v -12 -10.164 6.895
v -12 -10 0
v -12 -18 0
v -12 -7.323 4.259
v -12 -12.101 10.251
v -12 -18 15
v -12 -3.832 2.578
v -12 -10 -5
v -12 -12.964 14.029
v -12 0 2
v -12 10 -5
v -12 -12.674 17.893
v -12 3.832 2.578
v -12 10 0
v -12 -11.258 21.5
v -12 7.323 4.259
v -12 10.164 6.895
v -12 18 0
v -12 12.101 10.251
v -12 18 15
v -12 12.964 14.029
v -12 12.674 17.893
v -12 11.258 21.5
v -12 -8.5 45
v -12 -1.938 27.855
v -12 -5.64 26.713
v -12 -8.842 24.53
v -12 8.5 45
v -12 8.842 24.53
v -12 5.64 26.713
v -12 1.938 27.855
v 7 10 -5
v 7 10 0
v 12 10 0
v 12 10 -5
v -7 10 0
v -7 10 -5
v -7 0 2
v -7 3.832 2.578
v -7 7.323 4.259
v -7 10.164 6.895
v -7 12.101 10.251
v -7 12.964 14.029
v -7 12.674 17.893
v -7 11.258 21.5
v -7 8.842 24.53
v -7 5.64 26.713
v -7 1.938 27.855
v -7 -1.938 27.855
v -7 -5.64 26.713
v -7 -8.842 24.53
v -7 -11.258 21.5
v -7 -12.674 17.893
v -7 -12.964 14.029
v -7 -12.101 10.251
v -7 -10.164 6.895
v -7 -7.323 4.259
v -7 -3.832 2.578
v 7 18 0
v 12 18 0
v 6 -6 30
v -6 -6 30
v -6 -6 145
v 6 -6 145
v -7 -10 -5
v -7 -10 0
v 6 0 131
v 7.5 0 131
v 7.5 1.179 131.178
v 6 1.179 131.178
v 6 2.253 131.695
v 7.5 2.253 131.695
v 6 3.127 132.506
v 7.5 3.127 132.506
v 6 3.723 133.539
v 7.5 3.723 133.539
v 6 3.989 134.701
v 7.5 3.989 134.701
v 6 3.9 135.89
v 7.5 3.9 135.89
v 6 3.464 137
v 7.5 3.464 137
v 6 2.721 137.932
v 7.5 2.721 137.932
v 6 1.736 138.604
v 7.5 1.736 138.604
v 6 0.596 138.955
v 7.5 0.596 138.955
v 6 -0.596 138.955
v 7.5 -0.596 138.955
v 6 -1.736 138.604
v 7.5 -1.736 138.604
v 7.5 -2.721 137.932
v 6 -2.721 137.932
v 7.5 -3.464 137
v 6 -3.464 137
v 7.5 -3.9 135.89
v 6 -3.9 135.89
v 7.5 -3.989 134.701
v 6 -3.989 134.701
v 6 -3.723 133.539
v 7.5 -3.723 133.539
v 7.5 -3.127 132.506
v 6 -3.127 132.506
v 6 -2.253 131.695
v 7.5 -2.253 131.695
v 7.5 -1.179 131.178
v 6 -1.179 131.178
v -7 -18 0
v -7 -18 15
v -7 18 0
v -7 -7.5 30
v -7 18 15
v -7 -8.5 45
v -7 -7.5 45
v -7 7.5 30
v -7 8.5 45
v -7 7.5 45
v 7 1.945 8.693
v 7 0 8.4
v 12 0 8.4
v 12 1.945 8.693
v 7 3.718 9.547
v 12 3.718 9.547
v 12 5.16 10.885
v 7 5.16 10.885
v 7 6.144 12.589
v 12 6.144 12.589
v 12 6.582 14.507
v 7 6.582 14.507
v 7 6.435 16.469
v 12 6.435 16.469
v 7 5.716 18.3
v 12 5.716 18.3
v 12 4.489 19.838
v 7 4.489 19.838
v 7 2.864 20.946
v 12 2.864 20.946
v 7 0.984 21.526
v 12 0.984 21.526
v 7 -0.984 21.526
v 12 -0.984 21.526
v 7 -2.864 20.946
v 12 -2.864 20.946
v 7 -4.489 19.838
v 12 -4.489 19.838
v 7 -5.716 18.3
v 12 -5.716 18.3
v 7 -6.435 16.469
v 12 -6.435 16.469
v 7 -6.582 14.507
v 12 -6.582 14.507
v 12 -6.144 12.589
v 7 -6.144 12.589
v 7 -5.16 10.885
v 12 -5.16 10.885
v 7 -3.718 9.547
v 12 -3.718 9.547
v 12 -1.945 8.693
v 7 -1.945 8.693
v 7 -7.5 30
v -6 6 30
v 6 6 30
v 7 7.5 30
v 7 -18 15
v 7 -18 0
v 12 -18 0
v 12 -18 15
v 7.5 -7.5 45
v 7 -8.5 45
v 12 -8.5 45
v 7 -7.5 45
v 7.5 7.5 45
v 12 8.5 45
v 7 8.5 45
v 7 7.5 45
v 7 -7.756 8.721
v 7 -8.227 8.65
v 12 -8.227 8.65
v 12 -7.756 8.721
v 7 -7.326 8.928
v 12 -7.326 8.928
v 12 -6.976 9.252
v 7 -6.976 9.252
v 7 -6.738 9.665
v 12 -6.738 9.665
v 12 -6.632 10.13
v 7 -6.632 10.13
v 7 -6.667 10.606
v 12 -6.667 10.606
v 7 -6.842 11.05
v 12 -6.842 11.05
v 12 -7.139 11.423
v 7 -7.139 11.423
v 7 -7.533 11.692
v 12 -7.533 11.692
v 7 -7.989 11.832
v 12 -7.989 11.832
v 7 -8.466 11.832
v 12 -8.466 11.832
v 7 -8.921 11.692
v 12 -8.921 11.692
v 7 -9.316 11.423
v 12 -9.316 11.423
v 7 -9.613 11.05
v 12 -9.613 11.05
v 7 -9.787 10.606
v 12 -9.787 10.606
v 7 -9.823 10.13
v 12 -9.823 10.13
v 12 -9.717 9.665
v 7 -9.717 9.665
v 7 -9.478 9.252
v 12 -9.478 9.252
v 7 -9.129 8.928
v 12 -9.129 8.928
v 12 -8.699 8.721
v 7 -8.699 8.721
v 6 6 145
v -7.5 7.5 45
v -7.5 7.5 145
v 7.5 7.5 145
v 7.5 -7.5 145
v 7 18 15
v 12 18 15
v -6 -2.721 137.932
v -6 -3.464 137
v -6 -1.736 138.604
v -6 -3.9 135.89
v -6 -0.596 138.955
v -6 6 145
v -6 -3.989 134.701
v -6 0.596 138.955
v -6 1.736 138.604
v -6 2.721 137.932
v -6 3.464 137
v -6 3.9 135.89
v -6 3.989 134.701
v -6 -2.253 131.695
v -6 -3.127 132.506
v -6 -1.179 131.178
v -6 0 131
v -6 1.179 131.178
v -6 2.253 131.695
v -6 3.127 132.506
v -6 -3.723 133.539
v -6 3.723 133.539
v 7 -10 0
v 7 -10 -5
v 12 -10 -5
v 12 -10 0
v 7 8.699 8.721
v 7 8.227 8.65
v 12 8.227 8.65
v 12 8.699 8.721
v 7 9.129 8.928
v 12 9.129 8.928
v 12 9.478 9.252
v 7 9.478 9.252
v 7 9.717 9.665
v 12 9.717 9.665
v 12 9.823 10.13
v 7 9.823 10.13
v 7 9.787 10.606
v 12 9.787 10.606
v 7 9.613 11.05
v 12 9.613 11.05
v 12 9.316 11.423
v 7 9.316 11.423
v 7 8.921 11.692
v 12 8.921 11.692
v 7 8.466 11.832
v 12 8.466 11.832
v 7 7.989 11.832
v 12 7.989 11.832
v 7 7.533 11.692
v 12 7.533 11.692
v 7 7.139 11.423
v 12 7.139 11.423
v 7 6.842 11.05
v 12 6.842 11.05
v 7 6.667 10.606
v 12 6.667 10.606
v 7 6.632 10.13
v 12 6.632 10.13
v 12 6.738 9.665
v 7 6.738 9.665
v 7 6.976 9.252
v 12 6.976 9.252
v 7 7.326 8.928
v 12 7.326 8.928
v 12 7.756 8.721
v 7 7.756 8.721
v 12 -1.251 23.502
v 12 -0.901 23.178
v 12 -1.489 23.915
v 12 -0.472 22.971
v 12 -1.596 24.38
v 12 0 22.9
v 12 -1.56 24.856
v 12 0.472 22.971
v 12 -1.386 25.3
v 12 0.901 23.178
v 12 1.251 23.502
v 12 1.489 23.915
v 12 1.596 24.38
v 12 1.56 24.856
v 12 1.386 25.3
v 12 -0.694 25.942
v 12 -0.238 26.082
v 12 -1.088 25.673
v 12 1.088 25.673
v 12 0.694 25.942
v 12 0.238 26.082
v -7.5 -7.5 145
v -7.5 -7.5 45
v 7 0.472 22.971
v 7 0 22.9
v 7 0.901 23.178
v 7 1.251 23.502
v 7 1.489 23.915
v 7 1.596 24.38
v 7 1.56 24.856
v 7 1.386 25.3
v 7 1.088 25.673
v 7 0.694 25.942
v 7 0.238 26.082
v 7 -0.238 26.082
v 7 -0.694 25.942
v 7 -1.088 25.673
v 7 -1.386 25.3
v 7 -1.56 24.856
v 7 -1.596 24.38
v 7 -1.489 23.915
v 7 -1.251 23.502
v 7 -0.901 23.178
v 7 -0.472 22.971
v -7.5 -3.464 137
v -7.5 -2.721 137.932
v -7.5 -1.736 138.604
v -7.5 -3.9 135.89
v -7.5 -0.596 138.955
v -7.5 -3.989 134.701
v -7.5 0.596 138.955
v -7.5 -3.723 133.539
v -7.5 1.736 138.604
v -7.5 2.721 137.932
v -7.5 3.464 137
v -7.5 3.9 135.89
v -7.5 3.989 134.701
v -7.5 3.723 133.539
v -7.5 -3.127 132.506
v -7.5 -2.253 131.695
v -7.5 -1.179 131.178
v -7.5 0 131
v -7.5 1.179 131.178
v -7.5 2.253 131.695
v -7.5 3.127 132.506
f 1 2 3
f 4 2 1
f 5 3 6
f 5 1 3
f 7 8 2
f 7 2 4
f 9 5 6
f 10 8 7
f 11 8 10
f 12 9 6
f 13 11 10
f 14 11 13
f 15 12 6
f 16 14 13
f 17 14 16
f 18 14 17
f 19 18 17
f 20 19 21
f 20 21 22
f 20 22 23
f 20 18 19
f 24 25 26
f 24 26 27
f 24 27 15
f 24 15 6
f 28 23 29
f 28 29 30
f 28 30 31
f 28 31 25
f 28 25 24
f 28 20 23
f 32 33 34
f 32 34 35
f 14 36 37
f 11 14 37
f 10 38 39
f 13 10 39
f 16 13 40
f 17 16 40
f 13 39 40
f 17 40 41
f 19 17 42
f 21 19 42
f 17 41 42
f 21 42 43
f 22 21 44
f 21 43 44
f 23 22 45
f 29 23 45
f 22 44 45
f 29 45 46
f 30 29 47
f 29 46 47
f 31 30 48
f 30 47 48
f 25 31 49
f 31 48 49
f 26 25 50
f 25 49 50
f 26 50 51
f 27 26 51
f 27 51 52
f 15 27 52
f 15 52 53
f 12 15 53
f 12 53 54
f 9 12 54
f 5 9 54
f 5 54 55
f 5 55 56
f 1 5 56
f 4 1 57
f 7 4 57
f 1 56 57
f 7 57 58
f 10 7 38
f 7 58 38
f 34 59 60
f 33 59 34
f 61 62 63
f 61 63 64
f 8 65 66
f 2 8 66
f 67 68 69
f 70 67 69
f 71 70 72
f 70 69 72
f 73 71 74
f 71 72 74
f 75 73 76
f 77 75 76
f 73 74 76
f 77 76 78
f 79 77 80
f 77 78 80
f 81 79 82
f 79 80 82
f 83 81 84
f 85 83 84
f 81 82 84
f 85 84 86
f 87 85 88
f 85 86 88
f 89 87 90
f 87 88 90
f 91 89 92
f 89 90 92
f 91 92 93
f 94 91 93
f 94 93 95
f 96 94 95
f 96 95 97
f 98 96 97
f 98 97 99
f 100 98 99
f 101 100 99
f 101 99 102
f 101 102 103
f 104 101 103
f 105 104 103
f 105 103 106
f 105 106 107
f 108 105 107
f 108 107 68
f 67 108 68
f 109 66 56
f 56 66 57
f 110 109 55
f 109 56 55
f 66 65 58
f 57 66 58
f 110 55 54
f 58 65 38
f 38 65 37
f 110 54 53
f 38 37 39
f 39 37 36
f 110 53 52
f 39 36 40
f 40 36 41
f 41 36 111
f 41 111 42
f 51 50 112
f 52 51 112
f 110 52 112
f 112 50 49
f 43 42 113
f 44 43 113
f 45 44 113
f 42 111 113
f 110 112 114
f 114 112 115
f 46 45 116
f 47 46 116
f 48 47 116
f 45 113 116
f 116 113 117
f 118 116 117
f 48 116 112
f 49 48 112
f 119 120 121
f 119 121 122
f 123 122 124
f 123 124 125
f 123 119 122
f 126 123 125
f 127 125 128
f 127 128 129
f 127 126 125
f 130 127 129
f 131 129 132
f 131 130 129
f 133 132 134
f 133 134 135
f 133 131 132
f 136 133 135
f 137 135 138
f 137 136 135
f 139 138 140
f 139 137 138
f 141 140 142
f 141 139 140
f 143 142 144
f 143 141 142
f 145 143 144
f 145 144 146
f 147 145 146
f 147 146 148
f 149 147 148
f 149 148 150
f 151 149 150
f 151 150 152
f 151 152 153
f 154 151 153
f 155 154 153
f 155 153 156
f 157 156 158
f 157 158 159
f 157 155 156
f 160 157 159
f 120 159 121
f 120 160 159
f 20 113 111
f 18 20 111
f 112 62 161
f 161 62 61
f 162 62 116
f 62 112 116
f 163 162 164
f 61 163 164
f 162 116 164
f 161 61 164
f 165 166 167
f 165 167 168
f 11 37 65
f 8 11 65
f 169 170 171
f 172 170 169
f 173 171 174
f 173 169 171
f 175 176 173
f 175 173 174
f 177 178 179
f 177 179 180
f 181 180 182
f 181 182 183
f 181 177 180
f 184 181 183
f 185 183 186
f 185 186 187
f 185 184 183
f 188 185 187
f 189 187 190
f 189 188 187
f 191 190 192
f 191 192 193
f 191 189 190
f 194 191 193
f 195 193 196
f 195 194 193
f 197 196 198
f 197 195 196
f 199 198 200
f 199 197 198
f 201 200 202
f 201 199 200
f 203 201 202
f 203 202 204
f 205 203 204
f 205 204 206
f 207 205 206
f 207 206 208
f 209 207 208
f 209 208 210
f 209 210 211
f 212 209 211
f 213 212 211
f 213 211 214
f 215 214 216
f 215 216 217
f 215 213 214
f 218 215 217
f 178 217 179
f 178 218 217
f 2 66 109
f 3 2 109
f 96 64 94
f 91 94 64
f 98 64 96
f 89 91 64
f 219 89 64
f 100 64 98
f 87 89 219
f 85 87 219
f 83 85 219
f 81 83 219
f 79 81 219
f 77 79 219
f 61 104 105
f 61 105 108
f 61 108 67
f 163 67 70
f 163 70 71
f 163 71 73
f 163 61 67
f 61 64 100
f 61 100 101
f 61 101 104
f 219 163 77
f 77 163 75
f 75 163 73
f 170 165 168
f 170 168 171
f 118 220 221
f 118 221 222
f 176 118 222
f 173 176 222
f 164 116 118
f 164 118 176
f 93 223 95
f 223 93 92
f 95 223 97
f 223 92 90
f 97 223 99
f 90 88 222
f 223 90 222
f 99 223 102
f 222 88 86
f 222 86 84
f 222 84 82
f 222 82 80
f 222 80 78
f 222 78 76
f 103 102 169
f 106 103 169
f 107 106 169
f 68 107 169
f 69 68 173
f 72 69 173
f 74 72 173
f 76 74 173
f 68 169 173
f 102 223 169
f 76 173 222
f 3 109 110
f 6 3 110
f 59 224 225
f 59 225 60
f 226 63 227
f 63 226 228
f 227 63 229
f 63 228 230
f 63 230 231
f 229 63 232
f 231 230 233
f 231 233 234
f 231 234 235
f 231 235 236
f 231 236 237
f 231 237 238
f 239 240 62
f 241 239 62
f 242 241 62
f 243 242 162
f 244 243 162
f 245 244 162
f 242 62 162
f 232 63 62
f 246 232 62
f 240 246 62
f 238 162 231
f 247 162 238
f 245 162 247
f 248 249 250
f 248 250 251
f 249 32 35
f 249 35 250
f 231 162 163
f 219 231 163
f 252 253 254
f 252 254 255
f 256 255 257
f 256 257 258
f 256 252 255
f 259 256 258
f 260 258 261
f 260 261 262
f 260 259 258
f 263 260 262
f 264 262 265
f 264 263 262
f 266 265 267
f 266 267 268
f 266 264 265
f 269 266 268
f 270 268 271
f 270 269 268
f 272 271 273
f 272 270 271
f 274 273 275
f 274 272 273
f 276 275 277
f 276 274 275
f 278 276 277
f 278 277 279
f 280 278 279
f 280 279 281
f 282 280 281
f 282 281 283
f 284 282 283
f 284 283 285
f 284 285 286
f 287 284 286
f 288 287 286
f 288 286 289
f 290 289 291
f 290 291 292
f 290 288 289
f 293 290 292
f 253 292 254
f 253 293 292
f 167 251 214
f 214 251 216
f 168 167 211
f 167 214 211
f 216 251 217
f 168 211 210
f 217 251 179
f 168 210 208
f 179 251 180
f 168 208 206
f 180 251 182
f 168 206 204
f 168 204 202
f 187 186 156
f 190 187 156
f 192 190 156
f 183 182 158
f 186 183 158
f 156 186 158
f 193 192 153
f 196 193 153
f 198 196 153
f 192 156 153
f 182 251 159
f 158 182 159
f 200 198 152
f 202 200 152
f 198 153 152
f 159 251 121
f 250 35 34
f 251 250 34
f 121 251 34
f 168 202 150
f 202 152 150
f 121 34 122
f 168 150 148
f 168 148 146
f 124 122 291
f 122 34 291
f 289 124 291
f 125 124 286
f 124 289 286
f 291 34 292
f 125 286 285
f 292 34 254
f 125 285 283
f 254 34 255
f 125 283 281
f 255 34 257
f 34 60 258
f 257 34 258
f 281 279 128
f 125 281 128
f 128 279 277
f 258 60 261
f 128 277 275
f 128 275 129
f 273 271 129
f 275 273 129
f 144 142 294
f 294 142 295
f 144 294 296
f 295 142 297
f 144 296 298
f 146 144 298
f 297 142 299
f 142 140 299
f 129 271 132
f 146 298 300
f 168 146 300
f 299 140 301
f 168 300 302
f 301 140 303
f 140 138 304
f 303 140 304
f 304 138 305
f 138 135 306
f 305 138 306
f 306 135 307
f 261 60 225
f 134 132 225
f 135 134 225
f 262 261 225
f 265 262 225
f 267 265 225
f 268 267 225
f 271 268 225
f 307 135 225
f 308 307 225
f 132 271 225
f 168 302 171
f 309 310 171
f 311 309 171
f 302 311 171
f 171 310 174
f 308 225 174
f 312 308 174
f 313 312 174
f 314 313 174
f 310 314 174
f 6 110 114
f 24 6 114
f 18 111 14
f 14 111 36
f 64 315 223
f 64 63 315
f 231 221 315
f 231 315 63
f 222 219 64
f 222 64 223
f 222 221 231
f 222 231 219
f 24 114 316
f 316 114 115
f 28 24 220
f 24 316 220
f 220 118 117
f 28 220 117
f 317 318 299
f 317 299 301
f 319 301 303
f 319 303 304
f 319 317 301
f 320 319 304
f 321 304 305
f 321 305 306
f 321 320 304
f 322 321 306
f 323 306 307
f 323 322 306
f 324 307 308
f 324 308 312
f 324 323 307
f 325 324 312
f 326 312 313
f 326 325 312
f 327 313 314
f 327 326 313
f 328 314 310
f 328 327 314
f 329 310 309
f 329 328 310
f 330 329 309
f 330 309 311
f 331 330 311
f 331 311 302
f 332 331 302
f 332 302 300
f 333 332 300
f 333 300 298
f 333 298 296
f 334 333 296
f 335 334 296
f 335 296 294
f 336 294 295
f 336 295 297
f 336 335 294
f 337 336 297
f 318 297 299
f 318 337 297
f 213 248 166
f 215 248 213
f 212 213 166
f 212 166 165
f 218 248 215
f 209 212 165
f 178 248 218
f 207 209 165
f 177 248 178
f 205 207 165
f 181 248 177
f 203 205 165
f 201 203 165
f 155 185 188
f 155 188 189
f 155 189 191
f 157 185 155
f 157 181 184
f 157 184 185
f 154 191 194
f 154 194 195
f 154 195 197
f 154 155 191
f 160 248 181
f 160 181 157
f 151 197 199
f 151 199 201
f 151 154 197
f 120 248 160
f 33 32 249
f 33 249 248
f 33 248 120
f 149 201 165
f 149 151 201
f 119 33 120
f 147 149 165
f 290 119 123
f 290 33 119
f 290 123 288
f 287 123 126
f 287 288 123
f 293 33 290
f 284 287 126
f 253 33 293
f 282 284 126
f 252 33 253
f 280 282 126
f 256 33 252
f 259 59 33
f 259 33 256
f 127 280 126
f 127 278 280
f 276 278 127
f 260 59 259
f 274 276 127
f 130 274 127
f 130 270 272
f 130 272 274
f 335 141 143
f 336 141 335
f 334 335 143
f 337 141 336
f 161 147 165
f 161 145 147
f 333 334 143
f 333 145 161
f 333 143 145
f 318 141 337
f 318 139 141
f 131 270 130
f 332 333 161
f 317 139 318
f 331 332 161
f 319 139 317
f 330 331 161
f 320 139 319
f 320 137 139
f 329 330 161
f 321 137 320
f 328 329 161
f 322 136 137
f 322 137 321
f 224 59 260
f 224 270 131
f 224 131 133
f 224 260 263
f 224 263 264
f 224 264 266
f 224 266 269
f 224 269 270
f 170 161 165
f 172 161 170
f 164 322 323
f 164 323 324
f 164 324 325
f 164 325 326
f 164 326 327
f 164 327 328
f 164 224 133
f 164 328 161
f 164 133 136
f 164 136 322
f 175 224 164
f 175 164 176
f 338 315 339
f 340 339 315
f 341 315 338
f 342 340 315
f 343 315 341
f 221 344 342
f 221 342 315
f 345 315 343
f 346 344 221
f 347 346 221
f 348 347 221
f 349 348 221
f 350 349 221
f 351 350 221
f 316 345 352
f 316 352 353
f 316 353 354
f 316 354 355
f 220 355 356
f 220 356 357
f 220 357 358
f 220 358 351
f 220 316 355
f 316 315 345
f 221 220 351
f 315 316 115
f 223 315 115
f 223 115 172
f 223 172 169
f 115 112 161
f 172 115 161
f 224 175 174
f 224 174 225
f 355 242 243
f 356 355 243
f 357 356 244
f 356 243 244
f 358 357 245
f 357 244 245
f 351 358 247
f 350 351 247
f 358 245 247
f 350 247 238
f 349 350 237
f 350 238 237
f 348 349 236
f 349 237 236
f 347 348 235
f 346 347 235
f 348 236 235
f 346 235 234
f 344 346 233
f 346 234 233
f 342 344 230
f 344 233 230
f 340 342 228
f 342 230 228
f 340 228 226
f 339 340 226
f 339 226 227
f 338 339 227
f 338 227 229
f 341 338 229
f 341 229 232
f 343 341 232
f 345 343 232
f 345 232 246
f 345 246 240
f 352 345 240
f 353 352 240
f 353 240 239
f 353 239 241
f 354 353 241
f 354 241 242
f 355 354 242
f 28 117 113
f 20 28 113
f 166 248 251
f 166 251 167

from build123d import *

# Parameters (mm, degrees)
SKETCH_3_R           = 6.6
SKETCH_3_R_2         = 1.6
EXTRUDE_1_DEPTH      = 5
SKETCH_5_R           = 13
EXTRUDE_2_DEPTH      = 5
EXTRUDE_3_DEPTH      = 100
EXTRUDE_3_DEPTH_BACK = 15
SKETCH_6_W           = 15
SKETCH_6_H           = 15
SKETCH_6_W_2         = 12
SKETCH_6_H_2         = 12
SKETCH_7_R           = 4
CUT_EXTRUDE_1_DEPTH  = 148.408446162


with BuildPart() as part:
    # ｽｹｯﾁ3 → ﾎﾞｽ - 押し出し1 (new body)
    with BuildSketch(Plane(origin=(7, 0, 0), x_dir=(0, 0, -1), z_dir=(1, 0, 0))):
        Polygon((5, 10), (5, -10), (0, -10), (0, -18), (-15, -18), (-45, -8.5), (-45, 8.5), (-15, 18), (0, 18), (0, 10), align=None)
        with Locations((-15, 0)):
            Circle(SKETCH_3_R, mode=Mode.SUBTRACT)
        with Locations((-24.5, 0)):
            Circle(SKETCH_3_R_2, mode=Mode.SUBTRACT)
        with Locations((-10.25, 8.227241336)):
            Circle(SKETCH_3_R_2, mode=Mode.SUBTRACT)
        with Locations((-10.25, -8.227241336)):
            Circle(SKETCH_3_R_2, mode=Mode.SUBTRACT)
    extrude(amount=EXTRUDE_1_DEPTH)



with BuildPart() as body_2:
    # ｽｹｯﾁ5 → ﾎﾞｽ - 押し出し2 (new body)
    with BuildSketch(Plane(origin=(-7, 0, 0), x_dir=(0, 0, -1), z_dir=(1, 0, 0))):
        Polygon((-45, -8.5), (-45, 8.5), (-15, 18), (0, 18), (0, 10), (5, 10), (5, -10), (0, -10), (0, -18), (-15, -18), align=None)
        with Locations((-15, 0)):
            Circle(SKETCH_5_R, mode=Mode.SUBTRACT)
    extrude(amount=-EXTRUDE_2_DEPTH)


with BuildPart() as part_1:
    add(part.part)

    add(body_2.part)  # ﾎﾞｽ - 押し出し3 merges body 2
    # ｽｹｯﾁ6 → ﾎﾞｽ - 押し出し3 (add, two sides: drawn at the far end of the back side and taken through both)
    with BuildSketch(Plane.XY.offset(45).offset(-EXTRUDE_3_DEPTH_BACK)):
        Rectangle(SKETCH_6_W, SKETCH_6_H)
        Rectangle(SKETCH_6_W_2, SKETCH_6_H_2, mode=Mode.SUBTRACT)
    extrude(amount=EXTRUDE_3_DEPTH + EXTRUDE_3_DEPTH_BACK)

    # ｽｹｯﾁ7 → ｶｯﾄ - 押し出し1 (cut, through all)
    with BuildSketch(Plane(origin=(7.5, 0, 0), x_dir=(0, 0, -1), z_dir=(1, 0, 0))):
        with Locations((-135, 0)):
            Circle(SKETCH_7_R)
    extrude(amount=-CUT_EXTRUDE_1_DEPTH, mode=Mode.SUBTRACT)


solid = part_1.part
